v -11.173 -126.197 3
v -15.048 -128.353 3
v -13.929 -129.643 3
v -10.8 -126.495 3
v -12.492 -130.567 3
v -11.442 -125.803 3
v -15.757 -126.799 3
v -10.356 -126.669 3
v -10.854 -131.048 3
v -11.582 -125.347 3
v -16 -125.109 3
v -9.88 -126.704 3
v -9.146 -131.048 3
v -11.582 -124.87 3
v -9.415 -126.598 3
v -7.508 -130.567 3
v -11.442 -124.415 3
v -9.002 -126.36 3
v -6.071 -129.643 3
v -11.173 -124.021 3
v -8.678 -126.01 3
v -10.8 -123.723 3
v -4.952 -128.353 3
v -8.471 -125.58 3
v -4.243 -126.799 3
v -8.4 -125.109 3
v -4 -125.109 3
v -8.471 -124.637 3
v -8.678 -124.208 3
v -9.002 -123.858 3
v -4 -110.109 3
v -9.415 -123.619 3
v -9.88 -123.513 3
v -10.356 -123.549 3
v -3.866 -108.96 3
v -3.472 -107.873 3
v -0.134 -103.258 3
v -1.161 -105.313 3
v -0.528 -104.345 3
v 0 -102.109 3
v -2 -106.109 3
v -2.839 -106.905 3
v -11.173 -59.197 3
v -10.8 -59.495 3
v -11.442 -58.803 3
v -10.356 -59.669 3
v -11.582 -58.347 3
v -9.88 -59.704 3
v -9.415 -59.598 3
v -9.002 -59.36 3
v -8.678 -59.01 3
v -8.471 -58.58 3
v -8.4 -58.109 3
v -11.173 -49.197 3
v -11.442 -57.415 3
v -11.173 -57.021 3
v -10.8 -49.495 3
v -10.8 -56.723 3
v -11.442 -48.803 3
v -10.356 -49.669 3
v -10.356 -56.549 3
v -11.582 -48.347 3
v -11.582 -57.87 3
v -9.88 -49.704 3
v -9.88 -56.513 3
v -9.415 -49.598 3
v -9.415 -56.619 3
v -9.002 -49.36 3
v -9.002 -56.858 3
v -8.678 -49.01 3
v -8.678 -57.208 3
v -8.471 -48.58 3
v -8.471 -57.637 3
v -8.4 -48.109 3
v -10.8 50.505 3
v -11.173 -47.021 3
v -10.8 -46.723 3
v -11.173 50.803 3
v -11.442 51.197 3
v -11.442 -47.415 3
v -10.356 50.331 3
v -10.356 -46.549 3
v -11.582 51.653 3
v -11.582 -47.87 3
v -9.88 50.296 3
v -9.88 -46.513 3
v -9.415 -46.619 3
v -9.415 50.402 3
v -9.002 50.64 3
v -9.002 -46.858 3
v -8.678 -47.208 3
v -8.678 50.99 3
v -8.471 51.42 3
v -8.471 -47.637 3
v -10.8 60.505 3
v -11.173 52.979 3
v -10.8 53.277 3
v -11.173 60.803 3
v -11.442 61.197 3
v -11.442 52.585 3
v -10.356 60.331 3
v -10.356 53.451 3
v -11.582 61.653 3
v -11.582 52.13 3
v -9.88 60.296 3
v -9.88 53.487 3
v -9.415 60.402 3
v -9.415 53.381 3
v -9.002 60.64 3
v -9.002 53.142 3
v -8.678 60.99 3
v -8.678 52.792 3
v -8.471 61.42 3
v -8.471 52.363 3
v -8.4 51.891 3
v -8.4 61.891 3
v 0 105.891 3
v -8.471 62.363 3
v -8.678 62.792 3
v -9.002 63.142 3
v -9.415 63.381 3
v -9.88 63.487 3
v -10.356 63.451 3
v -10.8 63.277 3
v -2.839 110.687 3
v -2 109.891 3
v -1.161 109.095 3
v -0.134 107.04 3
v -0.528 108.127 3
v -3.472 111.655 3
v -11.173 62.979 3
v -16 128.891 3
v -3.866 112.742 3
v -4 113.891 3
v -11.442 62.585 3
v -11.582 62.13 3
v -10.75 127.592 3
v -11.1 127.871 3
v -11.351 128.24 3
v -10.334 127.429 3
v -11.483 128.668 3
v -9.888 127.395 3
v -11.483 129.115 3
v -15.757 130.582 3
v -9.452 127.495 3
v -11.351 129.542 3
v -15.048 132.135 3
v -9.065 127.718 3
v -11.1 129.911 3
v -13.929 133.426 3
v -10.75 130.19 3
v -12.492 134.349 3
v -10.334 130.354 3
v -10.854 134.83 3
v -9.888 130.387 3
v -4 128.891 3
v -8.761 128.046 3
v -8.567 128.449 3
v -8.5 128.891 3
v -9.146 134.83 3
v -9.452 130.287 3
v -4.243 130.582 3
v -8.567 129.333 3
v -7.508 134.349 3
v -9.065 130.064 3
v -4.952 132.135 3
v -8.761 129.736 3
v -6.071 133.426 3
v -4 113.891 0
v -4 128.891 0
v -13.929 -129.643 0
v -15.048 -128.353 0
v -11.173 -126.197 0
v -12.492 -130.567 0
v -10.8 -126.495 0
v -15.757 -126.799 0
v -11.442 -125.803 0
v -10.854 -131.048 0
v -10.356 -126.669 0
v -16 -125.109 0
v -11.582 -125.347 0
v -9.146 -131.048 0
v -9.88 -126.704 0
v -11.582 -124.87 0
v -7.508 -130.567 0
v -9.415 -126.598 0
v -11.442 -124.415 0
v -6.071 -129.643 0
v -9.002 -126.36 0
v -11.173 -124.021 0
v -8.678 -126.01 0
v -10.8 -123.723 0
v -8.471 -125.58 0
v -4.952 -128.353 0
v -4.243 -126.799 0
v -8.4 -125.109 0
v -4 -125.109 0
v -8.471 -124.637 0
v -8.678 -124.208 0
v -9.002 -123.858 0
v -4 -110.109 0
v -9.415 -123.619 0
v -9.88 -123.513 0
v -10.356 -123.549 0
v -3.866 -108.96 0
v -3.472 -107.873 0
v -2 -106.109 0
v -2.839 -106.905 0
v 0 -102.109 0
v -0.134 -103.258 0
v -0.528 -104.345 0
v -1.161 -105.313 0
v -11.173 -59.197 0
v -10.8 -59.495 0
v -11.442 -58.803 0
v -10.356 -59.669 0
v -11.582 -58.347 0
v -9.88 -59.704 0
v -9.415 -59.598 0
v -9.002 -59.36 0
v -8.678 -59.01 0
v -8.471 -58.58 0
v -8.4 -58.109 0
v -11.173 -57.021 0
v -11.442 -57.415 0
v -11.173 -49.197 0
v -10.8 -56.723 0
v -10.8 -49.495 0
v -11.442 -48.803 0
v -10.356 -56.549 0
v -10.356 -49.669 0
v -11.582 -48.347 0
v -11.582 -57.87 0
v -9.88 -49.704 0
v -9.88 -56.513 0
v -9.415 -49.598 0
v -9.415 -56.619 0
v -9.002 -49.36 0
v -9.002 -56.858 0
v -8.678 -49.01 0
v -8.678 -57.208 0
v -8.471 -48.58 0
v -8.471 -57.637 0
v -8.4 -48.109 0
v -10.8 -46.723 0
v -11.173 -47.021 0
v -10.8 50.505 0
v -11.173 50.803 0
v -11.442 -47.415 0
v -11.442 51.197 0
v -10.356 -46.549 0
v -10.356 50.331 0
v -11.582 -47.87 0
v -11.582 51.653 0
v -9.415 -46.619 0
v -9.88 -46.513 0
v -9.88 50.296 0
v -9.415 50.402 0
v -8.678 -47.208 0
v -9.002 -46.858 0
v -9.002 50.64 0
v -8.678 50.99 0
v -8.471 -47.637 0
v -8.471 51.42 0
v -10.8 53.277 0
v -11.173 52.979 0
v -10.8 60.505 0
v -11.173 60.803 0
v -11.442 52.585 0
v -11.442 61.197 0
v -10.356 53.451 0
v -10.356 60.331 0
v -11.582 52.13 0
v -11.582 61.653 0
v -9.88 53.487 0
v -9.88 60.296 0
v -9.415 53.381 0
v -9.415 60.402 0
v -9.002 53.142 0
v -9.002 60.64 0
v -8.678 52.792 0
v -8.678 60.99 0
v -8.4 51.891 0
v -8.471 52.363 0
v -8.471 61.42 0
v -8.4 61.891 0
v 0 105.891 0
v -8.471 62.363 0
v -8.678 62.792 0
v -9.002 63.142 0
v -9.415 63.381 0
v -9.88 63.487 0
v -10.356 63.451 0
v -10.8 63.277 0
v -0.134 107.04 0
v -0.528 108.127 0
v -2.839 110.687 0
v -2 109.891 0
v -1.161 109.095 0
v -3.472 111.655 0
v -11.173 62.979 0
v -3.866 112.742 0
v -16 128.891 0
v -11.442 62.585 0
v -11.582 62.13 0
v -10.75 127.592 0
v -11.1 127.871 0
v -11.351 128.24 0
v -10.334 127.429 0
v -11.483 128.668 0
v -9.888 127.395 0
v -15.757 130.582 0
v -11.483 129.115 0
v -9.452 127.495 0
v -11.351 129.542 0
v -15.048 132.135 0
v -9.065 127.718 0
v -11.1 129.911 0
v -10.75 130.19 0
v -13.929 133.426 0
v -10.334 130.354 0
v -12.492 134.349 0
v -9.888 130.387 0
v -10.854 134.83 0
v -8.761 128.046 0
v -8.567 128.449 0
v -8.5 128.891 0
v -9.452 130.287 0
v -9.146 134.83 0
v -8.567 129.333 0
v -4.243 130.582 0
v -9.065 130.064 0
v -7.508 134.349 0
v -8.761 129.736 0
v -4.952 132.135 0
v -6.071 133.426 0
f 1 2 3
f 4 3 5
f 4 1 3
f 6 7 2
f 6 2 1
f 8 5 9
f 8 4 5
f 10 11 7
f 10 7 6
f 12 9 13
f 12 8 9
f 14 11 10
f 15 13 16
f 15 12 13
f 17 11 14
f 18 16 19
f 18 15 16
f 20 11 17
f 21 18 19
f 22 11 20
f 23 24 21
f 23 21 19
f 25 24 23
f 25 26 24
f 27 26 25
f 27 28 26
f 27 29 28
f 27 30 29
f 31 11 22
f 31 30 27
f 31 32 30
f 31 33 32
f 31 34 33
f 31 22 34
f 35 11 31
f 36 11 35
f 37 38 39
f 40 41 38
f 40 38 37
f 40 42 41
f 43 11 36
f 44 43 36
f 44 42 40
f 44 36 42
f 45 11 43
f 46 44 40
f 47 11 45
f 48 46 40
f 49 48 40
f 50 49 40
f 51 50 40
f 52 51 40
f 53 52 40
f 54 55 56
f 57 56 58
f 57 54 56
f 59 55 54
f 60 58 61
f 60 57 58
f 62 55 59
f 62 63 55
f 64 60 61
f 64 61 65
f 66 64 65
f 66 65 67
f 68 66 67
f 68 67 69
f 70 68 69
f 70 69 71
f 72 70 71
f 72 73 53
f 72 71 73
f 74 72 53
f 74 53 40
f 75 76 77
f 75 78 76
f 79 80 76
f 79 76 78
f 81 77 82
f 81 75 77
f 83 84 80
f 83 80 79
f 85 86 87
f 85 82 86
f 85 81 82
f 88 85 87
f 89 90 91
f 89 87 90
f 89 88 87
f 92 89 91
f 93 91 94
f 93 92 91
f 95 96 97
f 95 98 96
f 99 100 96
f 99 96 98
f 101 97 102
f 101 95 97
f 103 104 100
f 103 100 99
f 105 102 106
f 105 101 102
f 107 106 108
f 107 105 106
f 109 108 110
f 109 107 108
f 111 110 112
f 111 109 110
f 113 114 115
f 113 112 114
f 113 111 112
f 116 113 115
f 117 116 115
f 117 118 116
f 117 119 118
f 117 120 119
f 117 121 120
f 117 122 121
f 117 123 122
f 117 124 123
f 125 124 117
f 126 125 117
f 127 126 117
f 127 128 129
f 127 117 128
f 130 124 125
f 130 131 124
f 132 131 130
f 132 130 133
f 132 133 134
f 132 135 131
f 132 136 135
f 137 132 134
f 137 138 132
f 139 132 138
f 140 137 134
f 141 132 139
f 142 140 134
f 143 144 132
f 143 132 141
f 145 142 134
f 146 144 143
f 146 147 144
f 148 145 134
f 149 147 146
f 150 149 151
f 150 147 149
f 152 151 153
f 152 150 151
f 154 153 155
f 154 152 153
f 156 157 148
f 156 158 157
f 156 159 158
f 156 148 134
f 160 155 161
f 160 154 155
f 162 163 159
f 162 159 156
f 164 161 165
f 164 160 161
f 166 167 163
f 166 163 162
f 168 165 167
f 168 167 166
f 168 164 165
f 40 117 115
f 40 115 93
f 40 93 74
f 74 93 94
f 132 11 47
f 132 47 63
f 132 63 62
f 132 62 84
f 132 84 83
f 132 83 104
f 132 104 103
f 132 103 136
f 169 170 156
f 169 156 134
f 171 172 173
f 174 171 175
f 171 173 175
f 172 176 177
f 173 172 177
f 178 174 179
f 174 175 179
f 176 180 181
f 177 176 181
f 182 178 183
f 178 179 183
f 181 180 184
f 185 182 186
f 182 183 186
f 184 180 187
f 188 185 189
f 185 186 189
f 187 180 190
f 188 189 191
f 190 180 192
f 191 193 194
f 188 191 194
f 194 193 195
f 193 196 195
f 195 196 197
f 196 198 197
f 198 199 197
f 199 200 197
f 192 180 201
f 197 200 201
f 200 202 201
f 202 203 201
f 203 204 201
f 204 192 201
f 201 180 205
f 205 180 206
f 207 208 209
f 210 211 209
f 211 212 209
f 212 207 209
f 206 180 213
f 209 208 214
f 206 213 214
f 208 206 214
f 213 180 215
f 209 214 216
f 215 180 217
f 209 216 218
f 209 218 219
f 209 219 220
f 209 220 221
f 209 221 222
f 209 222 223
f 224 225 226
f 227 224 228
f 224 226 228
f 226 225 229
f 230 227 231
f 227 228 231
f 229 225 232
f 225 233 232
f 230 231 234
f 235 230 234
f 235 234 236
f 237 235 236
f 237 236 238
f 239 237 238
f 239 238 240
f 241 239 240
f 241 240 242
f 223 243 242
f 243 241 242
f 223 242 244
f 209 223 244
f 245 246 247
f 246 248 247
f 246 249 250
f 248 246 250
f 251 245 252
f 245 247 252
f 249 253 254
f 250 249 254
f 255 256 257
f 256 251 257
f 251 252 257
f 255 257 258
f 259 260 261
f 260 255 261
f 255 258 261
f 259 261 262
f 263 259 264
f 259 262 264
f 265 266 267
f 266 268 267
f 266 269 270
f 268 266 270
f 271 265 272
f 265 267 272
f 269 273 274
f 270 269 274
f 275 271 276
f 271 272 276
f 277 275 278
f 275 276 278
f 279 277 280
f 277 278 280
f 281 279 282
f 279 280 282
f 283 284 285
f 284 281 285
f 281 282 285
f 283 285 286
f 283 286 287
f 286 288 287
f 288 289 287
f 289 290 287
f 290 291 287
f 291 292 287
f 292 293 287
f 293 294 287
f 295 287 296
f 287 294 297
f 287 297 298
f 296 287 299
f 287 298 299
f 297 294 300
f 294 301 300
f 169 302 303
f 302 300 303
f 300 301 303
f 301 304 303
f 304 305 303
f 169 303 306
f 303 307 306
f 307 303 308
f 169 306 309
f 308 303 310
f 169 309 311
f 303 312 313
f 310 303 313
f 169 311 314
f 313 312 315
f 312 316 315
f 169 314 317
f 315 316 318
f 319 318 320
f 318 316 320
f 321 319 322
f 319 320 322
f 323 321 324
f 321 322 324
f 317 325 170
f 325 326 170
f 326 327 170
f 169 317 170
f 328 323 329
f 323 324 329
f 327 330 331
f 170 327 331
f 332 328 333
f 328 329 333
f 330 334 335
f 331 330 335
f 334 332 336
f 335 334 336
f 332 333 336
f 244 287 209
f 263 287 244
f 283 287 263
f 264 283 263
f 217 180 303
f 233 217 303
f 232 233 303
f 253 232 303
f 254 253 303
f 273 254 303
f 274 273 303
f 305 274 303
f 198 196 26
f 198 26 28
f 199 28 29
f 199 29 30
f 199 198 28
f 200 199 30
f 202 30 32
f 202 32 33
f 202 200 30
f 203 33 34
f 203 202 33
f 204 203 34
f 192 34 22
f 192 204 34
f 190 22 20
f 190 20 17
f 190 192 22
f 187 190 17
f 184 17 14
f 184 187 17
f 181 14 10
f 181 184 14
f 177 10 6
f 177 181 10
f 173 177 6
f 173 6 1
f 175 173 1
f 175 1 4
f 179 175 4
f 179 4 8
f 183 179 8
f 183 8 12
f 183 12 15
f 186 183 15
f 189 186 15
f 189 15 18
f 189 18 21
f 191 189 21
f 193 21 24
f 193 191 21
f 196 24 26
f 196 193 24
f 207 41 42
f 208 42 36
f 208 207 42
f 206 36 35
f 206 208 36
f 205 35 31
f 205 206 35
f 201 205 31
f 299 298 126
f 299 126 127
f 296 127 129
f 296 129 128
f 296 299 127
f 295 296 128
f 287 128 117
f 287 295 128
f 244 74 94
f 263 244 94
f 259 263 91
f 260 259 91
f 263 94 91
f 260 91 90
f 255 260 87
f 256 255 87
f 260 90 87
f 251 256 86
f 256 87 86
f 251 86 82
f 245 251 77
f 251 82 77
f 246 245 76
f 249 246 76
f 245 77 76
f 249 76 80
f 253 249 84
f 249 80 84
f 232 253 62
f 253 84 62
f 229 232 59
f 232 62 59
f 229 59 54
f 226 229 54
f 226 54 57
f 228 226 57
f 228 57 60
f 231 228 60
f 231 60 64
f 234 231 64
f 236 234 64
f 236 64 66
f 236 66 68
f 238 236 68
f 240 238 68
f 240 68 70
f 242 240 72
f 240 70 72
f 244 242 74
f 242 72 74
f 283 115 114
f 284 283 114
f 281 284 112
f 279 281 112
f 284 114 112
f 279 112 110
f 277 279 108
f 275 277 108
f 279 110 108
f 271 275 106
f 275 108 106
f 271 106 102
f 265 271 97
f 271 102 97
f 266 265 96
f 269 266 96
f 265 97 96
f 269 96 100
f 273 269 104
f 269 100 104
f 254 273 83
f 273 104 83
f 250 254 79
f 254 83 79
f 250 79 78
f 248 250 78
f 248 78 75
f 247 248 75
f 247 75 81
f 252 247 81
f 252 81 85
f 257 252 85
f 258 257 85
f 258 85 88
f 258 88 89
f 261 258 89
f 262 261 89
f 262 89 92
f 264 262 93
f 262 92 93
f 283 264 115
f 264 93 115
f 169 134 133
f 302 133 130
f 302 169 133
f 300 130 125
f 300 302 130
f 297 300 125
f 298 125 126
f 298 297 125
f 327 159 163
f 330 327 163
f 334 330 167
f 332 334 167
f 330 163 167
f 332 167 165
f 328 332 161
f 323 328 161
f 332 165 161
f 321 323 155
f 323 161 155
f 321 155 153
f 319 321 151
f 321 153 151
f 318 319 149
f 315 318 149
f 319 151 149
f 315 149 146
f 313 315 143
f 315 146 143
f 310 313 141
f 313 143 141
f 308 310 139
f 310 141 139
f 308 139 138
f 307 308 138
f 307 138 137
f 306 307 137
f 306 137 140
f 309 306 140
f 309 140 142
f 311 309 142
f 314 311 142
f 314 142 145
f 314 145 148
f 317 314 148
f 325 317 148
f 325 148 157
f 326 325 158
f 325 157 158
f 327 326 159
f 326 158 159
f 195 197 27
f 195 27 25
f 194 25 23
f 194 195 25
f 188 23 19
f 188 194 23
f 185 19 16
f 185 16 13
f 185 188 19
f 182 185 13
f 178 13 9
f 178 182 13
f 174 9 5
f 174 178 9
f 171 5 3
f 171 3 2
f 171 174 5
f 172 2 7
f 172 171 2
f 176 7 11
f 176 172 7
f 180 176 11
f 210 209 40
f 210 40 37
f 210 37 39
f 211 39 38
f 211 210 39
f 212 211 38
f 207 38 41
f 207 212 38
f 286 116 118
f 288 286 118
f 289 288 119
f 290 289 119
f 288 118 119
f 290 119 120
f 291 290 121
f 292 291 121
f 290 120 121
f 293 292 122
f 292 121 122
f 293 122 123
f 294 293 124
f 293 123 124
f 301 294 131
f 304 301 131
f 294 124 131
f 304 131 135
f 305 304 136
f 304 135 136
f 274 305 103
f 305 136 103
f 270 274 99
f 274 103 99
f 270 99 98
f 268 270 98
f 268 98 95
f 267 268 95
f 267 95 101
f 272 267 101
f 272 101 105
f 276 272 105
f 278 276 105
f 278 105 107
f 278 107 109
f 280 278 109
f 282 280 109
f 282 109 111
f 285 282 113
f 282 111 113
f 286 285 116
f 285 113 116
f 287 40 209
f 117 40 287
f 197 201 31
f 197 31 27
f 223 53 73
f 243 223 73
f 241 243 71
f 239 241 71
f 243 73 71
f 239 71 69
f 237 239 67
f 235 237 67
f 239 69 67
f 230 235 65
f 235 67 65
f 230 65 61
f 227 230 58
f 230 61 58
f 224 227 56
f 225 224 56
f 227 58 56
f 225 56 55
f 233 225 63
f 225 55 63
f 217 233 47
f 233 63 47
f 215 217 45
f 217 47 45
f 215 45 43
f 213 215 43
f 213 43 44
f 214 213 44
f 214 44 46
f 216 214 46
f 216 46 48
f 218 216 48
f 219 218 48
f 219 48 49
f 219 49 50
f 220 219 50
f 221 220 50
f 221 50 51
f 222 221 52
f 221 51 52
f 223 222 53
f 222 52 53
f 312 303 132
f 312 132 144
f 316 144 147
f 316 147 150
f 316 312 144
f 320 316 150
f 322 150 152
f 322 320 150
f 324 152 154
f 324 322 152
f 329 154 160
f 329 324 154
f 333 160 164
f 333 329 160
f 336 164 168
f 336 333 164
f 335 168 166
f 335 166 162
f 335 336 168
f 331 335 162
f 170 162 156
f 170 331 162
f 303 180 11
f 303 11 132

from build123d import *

# Parameters (mm, degrees)
SKETCH_2_W               = 18
SKETCH_2_H               = 90
SKETCH_2_R               = 1.6
EXTRUDE_1_DEPTH          = 3
SKETCH_3_R               = 1.5
SKETCH_3_W               = 18
SKETCH_3_H               = 45
EXTRUDE_2_DEPTH          = 3
SKETCH_4_R               = 1.6
CUT_EXTRUDE_1_DEPTH      = 3
CUT_EXTRUDE_2_DEPTH      = 139.102072216
CUT_EXTRUDE_2_DEPTH_BACK = 3


with BuildPart() as part:
    # 草图2 → 凸台-拉伸1 (new body)
    with BuildSketch(Plane.XY):
        with Locations((-9, -88.108866795)):
            Rectangle(SKETCH_2_W, SKETCH_2_H)
        with Locations((-10, -125.108866795)):
            Circle(SKETCH_2_R, mode=Mode.SUBTRACT)
    extrude(amount=EXTRUDE_1_DEPTH)

    # 草图3 → 凸台-拉伸2 (add)
    # profile 1 of 2: a face of its own
    with BuildSketch(Plane.XY.offset(3)):
        Polygon((-18, 1.891133205), (0, 1.891133205), (0, 46.891133205), (0, 136.891133205), (-18, 136.891133205), (-18, 46.891133205), align=None)
        with Locations((-10, 128.891133205)):
            Circle(SKETCH_3_R, mode=Mode.SUBTRACT)
    # profile 2 of 2: a face of its own
    with BuildSketch(Plane.XY.offset(3)):
        with Locations((-9, -20.608866795)):
            Rectangle(SKETCH_3_W, SKETCH_3_H)
    extrude(amount=-EXTRUDE_2_DEPTH)

    # 草图4 → 切除-拉伸1 (cut)
    with BuildSketch(Plane.XY.offset(3)):
        with Locations((-10, -58.108866795)):
            Circle(SKETCH_4_R)
        with Locations((-10, -48.108866795)):
            Circle(SKETCH_4_R)
        with Locations((-10, 51.891133205)):
            Circle(SKETCH_4_R)
        with Locations((-10, 61.891133205)):
            Circle(SKETCH_4_R)
    extrude(amount=-CUT_EXTRUDE_1_DEPTH, mode=Mode.SUBTRACT)

    # 草图5 → 切除-拉伸2 (cut, two sides: drawn at the far end of the back side and taken through both)
    with BuildSketch(Plane.XY.offset(3).offset(-CUT_EXTRUDE_2_DEPTH_BACK)):
        with BuildLine():
            Line((-4, -110.108866795), (-4, -125.108866795))
            ThreePointArc((-4, -125.108866795), (-10, -131.108866795), (-16, -125.108866795))
            Line((-16, -125.108866795), (-16, 128.891133205))
            ThreePointArc((-16, 128.891133205), (-10, 134.891133205), (-4, 128.891133205))
            Line((-4, 128.891133205), (-4, 113.891133205))
            ThreePointArc((-4, 113.891133205), (-3.472135955, 111.655065228), (-2, 109.891133205))
            ThreePointArc((-2, 109.891133205), (-0.527864045, 108.127201183), (0, 105.891133205))
            Line((0, 105.891133205), (0, 136.891133205))
            Line((0, 136.891133205), (-18, 136.891133205))
            Line((-18, 136.891133205), (-18, -133.108866795))
            Line((-18, -133.108866795), (0, -133.108866795))
            Line((0, -133.108866795), (0, -102.108866795))
            ThreePointArc((0, -102.108866795), (-0.527864045, -104.344934772), (-2, -106.108866795))
            ThreePointArc((-2, -106.108866795), (-3.472135955, -107.872798817), (-4, -110.108866795))
        make_face()
    extrude(amount=CUT_EXTRUDE_2_DEPTH + CUT_EXTRUDE_2_DEPTH_BACK, mode=Mode.SUBTRACT)


solid = part.part
